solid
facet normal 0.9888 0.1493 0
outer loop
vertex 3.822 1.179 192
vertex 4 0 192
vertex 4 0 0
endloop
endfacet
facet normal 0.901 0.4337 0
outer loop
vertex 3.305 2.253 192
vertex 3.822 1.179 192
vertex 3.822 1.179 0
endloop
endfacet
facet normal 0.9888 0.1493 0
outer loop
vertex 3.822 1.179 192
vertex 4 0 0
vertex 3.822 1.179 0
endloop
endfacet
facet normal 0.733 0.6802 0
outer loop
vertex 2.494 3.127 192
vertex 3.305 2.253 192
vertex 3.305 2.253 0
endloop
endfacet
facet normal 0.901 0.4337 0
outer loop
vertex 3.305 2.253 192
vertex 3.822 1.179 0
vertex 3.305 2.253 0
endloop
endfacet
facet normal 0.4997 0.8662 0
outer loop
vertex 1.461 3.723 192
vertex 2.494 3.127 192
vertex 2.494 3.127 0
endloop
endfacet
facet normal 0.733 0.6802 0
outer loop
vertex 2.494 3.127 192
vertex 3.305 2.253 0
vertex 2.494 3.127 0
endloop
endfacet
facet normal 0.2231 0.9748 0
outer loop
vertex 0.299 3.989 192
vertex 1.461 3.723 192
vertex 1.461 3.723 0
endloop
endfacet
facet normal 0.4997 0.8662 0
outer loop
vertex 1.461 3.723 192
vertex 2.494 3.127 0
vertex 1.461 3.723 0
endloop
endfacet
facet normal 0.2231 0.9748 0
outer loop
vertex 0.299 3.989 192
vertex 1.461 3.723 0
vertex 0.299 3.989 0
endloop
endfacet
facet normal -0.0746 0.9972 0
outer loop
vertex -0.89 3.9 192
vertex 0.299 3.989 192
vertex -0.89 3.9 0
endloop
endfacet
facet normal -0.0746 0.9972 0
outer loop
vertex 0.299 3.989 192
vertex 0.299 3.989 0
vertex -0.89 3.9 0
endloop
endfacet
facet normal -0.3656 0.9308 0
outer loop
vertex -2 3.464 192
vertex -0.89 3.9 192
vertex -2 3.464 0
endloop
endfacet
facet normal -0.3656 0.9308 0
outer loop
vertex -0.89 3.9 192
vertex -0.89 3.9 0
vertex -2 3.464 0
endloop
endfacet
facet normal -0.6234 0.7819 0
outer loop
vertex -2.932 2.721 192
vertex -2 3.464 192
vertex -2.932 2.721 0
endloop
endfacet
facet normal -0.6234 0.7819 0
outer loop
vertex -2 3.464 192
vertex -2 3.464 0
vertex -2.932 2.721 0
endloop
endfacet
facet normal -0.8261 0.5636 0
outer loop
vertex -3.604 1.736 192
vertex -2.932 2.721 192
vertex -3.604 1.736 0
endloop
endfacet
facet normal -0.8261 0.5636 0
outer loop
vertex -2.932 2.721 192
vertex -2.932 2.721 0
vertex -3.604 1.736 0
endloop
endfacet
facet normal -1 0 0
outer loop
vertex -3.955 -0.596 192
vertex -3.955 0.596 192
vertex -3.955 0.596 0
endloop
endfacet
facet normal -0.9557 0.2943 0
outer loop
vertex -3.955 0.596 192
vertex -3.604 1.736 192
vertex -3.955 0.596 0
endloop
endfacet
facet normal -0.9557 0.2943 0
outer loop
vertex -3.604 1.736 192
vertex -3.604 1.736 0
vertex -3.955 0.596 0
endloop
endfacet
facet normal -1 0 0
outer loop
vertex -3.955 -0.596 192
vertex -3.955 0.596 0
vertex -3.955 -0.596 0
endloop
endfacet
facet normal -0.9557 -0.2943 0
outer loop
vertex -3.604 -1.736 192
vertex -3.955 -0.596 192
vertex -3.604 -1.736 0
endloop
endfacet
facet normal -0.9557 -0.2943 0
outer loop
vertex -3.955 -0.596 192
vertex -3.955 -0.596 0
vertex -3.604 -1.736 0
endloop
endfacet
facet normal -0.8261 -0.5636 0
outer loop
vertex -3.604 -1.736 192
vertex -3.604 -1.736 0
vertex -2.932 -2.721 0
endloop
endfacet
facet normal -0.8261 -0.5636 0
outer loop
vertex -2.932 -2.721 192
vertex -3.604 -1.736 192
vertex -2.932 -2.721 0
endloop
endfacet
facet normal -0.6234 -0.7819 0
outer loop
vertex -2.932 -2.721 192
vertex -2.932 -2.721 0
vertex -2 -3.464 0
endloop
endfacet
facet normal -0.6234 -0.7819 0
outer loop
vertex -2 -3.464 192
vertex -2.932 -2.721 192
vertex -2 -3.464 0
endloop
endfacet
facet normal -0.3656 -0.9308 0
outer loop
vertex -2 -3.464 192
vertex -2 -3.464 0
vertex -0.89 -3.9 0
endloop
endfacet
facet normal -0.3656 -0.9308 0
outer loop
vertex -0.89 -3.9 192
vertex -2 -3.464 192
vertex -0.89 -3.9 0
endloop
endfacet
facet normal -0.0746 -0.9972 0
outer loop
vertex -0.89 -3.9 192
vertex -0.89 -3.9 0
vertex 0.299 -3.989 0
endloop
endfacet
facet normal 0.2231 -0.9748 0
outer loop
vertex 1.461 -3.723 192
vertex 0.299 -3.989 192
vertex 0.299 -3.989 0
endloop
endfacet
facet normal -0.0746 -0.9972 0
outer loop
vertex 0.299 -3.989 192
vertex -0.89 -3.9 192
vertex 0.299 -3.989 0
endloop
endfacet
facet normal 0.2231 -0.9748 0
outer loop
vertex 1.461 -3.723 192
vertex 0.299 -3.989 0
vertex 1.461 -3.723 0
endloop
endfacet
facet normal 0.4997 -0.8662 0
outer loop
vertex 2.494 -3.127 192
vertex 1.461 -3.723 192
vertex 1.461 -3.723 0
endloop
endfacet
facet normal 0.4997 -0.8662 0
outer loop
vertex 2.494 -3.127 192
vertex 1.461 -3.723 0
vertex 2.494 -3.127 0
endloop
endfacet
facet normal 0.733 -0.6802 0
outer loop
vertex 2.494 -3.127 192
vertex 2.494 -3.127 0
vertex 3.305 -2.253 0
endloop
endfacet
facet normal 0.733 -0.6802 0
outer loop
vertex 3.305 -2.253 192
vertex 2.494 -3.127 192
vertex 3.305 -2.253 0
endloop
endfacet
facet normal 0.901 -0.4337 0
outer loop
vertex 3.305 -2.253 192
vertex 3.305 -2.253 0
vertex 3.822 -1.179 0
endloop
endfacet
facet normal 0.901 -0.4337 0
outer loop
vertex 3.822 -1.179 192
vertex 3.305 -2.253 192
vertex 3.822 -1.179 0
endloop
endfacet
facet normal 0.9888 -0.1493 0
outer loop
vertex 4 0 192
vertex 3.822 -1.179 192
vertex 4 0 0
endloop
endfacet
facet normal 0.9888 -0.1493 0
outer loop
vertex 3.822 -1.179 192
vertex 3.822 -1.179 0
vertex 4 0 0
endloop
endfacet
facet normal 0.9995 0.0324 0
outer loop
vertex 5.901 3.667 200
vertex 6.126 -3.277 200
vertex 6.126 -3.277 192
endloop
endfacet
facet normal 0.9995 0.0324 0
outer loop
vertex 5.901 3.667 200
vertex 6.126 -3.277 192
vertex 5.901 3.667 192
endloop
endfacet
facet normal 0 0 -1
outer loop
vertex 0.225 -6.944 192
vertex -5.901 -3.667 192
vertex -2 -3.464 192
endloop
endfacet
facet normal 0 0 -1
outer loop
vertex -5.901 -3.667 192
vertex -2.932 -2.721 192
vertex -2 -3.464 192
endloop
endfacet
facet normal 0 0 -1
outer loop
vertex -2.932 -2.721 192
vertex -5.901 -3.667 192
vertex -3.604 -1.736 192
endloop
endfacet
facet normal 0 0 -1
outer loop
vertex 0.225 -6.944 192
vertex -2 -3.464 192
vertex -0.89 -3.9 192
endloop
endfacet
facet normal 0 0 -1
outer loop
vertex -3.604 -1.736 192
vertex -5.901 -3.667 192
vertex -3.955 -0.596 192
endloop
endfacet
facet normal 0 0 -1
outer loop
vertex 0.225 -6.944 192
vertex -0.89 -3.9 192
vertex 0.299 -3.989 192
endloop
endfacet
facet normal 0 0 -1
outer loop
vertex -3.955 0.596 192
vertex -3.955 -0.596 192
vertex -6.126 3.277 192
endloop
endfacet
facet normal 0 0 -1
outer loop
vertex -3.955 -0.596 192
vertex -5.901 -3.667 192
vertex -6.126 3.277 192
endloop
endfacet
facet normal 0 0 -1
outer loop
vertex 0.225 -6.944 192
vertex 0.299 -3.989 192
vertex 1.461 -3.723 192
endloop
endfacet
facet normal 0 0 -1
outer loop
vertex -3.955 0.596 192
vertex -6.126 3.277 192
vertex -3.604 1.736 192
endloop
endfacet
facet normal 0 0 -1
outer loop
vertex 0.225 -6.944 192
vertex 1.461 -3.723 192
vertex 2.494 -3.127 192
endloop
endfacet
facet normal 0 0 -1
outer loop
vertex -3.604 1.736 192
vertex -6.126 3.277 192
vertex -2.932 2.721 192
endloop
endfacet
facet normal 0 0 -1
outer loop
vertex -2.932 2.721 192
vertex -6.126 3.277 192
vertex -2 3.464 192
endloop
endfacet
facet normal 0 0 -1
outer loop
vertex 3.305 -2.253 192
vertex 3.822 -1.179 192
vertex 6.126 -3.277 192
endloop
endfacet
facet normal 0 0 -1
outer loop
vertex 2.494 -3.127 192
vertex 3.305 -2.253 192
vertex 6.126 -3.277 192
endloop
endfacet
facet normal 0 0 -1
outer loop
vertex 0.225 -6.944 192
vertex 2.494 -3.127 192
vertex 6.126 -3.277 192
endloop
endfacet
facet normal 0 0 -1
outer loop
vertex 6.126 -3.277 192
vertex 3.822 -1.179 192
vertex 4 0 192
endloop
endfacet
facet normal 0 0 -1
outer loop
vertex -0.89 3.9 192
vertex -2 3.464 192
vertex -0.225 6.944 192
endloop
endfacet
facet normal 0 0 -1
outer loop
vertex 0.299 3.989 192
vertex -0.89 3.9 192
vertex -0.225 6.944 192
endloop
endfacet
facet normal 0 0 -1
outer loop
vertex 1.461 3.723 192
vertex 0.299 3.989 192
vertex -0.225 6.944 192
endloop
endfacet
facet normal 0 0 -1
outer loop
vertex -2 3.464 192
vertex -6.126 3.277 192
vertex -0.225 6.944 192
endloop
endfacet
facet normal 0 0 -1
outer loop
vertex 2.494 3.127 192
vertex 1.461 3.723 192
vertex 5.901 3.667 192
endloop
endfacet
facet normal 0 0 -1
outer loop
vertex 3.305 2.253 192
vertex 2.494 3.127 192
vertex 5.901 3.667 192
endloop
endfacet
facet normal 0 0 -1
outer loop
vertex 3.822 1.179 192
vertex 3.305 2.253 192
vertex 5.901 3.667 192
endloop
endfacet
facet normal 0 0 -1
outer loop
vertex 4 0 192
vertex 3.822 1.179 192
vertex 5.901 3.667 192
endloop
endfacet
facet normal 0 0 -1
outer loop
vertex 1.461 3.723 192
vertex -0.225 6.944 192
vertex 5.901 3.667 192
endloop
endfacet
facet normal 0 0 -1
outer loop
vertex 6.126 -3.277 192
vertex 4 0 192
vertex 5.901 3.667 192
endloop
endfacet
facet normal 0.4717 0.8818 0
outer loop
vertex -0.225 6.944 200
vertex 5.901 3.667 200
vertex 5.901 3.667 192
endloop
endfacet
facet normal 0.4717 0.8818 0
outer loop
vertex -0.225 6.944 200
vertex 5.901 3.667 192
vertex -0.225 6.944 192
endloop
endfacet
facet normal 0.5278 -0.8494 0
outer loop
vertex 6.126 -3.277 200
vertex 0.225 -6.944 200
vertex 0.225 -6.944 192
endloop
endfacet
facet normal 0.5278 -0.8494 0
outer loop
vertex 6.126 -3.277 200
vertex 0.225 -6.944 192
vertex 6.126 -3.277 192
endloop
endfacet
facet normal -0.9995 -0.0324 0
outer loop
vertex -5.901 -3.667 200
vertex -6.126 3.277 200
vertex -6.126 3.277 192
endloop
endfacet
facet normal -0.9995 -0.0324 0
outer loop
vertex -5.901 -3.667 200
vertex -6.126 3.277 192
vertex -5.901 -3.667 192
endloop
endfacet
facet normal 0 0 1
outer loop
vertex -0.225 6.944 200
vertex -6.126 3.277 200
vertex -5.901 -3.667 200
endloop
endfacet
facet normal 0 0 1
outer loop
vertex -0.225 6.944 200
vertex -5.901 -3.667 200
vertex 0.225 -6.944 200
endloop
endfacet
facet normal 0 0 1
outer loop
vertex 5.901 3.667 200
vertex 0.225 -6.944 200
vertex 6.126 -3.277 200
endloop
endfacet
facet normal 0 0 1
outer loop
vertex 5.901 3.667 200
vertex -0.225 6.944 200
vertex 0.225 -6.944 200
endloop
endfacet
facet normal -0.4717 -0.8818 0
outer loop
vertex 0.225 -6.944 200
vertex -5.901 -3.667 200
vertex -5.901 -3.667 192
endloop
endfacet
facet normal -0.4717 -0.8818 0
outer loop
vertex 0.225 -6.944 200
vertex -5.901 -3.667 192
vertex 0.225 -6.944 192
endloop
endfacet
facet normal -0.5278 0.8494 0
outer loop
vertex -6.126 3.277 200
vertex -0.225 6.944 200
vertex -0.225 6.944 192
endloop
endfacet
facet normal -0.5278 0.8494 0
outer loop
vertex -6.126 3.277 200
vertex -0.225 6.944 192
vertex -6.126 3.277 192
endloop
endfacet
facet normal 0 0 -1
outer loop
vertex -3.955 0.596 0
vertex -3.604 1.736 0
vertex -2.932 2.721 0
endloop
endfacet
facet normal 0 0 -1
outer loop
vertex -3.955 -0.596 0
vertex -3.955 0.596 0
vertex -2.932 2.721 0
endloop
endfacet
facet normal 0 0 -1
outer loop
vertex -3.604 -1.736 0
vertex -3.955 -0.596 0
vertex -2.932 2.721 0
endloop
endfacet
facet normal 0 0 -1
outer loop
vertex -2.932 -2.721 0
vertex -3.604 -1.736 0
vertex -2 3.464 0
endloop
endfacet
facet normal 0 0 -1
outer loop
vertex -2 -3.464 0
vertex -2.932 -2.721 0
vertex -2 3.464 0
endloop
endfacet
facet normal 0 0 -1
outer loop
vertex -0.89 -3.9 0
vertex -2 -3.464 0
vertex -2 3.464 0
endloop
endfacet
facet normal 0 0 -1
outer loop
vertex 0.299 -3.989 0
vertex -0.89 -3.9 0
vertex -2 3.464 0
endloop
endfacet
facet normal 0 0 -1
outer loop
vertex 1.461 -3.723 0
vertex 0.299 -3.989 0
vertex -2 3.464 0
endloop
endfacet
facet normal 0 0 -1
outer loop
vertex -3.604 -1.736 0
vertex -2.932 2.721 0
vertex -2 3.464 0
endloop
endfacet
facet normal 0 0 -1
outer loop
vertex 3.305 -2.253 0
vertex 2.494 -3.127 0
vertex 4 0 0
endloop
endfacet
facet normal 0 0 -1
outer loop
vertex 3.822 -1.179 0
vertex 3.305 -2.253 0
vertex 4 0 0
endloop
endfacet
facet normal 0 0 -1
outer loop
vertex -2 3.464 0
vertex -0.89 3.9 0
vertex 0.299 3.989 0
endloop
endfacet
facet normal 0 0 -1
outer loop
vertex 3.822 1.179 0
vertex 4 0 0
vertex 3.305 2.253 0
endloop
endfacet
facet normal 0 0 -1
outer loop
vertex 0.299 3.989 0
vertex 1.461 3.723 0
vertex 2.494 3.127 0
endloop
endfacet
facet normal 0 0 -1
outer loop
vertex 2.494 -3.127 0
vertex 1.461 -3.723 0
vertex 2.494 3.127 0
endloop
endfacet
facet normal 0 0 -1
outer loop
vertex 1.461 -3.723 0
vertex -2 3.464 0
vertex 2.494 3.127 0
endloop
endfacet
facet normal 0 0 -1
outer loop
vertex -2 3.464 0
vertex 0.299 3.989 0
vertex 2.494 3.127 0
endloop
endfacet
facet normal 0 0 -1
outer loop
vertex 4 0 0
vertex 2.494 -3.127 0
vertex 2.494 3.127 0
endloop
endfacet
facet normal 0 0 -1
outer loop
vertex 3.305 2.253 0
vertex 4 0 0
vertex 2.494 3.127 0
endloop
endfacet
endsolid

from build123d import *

# Parameters (mm, degrees)
F0_R     = 4
F1_DEPTH = 200
F3_DEPTH = 8


with BuildPart() as f1:
    # F0 (on Top) → F1 (new body)
    with BuildSketch(Plane.XY):
        Circle(F0_R)
    extrude(amount=F1_DEPTH)

    # F2 (on face) → F3 (join)
    with BuildSketch(Plane.XY.offset(200)):
        Polygon((5.900696, 3.666764), (-0.225163, 6.943534), (-6.125859, 3.276771), (-5.900696, -3.666764), (0.225163, -6.943534), (6.125859, -3.276771), align=None)
    extrude(amount=-F3_DEPTH)


solid = f1.part
